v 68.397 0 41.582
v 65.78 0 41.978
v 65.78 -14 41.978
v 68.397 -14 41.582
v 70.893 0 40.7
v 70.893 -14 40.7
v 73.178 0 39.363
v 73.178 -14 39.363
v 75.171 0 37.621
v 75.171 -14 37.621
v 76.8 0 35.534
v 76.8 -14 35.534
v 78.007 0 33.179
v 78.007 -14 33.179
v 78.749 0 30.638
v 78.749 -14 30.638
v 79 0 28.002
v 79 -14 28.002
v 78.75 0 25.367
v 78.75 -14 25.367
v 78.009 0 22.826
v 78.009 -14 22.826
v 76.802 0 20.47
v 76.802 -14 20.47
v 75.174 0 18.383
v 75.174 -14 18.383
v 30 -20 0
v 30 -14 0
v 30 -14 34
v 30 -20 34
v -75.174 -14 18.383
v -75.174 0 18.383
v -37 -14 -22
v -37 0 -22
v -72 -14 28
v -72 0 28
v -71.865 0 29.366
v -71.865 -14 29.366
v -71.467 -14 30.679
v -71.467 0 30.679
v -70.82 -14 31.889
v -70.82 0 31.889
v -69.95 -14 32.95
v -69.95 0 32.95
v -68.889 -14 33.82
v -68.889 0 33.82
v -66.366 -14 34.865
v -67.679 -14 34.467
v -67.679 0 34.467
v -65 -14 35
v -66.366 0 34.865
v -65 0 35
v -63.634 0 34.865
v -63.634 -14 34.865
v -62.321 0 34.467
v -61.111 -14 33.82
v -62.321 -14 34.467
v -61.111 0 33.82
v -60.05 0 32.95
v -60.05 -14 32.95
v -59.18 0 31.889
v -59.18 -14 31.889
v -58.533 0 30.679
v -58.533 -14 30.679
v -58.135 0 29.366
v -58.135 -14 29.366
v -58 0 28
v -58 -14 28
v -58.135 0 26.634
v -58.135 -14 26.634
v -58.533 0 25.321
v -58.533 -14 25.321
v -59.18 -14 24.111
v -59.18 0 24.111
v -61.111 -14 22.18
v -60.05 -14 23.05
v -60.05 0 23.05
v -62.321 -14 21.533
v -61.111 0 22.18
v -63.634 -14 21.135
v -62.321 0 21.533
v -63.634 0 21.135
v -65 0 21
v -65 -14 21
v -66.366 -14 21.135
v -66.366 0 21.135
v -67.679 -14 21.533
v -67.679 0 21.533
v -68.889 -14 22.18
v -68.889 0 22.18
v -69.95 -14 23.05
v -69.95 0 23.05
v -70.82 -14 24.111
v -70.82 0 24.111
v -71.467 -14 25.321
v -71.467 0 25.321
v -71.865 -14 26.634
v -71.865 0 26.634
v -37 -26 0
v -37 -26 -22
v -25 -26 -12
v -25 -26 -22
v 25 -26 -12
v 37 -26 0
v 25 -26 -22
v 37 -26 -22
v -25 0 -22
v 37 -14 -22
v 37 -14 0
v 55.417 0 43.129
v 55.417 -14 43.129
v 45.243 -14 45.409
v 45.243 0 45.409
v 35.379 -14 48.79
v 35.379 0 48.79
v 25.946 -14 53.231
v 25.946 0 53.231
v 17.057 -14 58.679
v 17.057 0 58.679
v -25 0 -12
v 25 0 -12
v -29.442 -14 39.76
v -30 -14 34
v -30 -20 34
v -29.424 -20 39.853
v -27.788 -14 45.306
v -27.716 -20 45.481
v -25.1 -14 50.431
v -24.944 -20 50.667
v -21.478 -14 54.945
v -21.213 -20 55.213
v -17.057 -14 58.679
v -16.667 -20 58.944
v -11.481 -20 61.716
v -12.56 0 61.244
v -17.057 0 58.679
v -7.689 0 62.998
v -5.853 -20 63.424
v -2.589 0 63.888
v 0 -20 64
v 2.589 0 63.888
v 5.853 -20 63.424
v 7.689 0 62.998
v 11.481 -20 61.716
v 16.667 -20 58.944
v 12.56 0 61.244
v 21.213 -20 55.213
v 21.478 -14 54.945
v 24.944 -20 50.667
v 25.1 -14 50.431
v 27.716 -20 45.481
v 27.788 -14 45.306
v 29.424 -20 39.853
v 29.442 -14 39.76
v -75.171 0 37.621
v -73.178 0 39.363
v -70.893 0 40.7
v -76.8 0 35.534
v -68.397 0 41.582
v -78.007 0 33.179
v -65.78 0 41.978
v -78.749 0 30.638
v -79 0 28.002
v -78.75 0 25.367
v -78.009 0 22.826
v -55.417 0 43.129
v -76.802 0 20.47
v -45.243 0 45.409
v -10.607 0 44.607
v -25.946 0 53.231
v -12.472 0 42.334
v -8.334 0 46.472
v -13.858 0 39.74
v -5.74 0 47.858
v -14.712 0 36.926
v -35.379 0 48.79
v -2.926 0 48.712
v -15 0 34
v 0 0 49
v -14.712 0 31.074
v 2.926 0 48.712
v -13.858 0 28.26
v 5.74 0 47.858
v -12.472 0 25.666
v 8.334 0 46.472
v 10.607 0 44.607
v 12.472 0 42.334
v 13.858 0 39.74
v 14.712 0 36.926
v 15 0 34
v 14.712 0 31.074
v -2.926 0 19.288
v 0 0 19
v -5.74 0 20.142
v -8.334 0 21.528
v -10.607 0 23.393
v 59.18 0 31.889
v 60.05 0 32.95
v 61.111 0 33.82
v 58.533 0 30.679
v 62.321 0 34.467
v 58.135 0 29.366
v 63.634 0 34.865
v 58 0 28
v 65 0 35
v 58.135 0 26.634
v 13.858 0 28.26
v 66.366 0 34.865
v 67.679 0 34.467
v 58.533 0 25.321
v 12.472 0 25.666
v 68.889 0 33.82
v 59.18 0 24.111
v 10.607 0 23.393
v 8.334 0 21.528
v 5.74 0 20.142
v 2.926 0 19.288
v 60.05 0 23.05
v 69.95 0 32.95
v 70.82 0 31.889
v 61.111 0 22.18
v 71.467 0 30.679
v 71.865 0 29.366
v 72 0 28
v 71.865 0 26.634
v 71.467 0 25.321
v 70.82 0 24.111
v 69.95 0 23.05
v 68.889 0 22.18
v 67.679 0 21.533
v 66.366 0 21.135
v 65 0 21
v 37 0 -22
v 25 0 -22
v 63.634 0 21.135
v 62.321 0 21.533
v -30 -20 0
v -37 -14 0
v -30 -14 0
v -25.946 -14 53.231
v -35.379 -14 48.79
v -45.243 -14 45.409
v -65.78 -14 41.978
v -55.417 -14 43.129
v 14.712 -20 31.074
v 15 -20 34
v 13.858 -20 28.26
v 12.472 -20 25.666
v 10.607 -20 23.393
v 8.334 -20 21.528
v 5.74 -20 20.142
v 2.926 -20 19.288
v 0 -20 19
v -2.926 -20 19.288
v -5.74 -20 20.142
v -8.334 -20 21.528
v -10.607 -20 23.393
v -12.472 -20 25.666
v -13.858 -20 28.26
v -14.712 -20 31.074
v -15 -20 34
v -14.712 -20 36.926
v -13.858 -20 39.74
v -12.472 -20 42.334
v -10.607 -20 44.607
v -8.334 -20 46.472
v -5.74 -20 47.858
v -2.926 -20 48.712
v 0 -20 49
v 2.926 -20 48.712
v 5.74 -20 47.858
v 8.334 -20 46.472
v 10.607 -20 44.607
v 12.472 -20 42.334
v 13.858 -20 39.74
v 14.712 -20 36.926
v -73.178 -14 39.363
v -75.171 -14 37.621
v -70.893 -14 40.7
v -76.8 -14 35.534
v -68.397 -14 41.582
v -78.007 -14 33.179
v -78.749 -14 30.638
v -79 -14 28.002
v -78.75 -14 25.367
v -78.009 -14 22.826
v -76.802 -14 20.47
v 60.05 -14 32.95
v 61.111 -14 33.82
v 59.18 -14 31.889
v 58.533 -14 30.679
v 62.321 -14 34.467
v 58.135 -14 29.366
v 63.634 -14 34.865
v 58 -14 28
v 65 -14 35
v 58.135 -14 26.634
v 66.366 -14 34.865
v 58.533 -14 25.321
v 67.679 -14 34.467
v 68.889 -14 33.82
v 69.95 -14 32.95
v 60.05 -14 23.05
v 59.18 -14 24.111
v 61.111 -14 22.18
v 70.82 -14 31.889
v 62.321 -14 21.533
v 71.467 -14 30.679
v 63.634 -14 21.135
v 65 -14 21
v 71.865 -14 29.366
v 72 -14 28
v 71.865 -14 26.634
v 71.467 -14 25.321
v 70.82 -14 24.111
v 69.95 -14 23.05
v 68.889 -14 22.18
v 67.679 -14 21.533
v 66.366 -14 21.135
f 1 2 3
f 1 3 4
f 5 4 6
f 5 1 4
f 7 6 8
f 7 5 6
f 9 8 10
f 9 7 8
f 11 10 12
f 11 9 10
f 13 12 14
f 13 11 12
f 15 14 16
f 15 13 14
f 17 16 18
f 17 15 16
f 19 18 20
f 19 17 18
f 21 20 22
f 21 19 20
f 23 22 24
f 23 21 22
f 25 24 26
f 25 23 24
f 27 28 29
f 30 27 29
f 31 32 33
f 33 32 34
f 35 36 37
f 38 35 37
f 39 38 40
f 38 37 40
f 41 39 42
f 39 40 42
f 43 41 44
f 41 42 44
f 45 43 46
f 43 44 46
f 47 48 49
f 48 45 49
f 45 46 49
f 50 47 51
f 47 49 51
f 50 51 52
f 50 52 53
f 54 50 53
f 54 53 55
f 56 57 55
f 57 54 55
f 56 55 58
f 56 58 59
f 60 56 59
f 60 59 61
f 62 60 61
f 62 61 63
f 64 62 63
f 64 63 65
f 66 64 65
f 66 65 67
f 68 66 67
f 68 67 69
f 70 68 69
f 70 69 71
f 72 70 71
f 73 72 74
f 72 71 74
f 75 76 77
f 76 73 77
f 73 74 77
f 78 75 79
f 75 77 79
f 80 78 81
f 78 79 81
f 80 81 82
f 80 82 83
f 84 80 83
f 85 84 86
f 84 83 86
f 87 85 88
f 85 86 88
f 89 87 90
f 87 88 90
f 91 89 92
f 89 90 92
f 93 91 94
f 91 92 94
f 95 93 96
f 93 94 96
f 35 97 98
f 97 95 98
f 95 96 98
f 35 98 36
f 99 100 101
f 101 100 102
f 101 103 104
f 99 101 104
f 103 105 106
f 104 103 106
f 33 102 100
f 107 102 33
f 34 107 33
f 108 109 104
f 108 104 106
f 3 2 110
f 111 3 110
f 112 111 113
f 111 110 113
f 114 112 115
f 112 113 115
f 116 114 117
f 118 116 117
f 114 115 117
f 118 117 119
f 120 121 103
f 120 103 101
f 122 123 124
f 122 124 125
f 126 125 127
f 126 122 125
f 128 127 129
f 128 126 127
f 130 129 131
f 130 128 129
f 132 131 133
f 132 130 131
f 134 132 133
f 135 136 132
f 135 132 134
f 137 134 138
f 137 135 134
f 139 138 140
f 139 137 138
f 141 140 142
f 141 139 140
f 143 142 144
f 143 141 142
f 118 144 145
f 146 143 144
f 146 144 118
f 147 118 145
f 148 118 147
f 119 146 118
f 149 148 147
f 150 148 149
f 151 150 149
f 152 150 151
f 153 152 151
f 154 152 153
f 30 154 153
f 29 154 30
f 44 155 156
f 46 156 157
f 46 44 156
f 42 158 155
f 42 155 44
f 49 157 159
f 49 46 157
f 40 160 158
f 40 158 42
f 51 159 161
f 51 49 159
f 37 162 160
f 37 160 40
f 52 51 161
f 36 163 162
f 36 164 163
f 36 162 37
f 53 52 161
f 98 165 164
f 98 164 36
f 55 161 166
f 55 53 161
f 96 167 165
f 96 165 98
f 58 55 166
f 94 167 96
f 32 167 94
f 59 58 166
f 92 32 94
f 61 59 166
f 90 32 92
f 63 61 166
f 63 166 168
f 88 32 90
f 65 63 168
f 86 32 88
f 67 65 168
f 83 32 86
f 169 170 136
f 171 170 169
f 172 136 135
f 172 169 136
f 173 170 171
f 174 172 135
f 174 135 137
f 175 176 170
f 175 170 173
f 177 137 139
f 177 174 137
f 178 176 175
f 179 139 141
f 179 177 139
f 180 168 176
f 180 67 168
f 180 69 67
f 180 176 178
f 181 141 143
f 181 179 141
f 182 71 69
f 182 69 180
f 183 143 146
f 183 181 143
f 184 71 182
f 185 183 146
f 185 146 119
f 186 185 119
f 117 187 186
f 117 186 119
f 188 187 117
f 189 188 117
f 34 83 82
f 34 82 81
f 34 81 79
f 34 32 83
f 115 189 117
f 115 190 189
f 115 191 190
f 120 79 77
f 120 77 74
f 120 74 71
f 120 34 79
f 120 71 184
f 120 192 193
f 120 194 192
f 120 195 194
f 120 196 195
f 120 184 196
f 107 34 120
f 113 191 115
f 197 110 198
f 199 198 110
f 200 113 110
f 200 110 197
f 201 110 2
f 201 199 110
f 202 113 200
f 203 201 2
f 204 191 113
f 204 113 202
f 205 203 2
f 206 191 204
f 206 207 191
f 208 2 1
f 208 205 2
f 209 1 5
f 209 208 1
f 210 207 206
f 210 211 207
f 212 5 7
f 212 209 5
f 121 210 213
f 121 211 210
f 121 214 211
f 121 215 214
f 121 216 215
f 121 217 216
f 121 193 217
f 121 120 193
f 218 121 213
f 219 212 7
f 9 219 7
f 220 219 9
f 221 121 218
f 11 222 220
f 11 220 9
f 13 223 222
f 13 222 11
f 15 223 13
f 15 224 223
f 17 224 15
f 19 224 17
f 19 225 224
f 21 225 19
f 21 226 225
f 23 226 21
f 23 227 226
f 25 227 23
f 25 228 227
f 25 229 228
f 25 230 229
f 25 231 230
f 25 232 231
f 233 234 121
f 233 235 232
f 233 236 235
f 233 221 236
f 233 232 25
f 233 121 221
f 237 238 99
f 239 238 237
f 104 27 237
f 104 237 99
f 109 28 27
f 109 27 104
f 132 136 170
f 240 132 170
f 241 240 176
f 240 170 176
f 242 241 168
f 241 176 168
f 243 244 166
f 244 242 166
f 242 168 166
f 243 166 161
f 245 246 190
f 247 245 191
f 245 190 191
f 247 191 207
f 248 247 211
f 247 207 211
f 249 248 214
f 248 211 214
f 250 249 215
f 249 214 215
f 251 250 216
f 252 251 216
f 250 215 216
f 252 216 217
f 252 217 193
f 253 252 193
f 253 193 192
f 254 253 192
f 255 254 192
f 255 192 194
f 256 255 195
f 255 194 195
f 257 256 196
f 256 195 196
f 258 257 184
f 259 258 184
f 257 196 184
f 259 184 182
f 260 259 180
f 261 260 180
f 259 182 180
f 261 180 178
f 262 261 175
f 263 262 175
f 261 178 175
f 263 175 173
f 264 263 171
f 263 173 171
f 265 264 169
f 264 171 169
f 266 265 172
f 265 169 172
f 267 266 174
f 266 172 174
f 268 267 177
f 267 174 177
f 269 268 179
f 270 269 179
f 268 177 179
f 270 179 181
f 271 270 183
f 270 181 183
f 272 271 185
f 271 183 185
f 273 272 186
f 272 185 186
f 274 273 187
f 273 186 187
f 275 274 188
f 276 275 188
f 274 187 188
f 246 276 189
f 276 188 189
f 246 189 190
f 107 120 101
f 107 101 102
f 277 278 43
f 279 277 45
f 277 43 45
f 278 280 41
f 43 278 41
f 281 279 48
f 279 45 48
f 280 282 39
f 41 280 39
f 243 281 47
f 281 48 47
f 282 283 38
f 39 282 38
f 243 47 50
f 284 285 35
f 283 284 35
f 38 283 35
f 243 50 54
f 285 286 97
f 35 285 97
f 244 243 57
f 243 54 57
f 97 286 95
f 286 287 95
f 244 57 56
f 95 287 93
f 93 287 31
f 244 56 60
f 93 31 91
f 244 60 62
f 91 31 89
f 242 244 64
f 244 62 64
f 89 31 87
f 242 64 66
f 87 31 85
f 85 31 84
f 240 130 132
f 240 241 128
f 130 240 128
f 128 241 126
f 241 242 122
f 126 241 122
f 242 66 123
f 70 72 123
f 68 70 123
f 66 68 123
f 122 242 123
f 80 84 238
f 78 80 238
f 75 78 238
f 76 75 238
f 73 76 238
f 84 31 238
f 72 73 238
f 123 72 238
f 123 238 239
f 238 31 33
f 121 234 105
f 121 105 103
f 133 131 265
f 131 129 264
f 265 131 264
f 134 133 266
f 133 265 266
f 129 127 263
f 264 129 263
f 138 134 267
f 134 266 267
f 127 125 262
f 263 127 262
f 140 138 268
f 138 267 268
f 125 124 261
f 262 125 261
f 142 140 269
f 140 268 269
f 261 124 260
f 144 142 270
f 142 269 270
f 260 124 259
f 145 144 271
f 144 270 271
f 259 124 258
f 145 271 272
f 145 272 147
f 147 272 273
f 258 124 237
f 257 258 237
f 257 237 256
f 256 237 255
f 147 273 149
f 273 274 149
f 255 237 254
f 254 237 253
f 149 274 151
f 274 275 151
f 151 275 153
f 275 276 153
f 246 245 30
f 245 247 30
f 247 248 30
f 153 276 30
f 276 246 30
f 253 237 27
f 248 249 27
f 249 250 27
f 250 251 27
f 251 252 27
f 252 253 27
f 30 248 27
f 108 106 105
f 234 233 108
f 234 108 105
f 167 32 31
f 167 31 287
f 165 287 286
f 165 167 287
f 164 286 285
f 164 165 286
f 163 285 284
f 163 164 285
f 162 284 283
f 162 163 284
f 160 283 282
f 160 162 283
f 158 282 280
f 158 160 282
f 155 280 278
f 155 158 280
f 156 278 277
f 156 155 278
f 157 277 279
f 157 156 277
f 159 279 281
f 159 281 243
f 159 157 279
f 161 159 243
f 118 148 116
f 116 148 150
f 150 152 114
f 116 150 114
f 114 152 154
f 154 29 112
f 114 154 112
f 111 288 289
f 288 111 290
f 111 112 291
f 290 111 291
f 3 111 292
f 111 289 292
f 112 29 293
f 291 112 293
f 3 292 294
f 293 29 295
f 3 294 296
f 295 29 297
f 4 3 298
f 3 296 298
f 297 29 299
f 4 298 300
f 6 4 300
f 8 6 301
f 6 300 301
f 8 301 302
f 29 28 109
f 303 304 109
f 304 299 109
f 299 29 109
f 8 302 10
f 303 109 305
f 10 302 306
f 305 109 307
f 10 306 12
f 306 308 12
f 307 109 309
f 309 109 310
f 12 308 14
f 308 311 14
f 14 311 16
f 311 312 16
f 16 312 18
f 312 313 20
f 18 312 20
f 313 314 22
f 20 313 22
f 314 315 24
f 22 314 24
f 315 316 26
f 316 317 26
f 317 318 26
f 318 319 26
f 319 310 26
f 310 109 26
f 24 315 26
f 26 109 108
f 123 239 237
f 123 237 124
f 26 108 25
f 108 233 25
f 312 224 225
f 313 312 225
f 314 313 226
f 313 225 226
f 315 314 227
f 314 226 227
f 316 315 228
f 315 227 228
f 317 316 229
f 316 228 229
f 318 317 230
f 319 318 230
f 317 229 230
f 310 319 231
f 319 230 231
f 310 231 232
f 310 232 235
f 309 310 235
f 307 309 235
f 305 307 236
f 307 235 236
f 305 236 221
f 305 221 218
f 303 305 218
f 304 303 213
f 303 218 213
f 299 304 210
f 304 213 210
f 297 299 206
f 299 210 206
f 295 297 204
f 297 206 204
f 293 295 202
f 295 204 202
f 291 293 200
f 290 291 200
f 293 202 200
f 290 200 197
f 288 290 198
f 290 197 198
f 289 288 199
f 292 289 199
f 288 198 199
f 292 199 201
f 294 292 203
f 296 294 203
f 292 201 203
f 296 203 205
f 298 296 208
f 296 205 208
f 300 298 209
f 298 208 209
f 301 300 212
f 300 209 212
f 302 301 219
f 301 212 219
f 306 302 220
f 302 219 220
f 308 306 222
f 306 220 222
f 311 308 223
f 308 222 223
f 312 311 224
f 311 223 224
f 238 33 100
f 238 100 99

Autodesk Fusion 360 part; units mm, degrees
sketch "Sketch1" plane through (0, 0, 0) normal (0, 1, 0) x (1, 0, 0)
  line L0 (-37, 0) -> (37, 0)
  line L1 (37, 0) -> (37, 22)
  line L2 (37, 22) -> (25, 22)
  line L3 (25, 22) -> (25, 12)
  line L4 (25, 12) -> (-25, 12)
  line L5 (-25, 12) -> (-25, 22)
  line L6 (-25, 22) -> (-37, 22)
  line L7 (-37, 22) -> (-37, 0)
  circle A0 centre (0, -34) radius 15
  circle A1 centre (0, -34) radius 30
  line L8 (-30, 0) -> (-30, -34)
  line L9 (30, 0) -> (30, -34)
  circle A2 centre (65, -28) radius 7
  circle A3 centre (65, -28) radius 14
  line L10 (37, 22) -> (75.1738, -18.3827)
  arc A4 (65.7795, -41.9783) -> (17.0566, -58.6794) centre (71.069, -136.8309) ccw
  dimension "d1" = 25
  dimension "d2" = 25
  dimension "d3" = 37
  dimension "d4" = 37
  dimension "d5" = 22
  dimension "d6" = 22
  dimension "d7" = 12
  dimension "d8" = 12
  dimension "d9" = 30
  dimension "d10" = 34
  dimension "d11" = 37
  dimension "d12" = 60
  dimension "d13" = 14
  dimension "d14" = 28
  dimension "d15" = 65
  dimension "d16" = 28
  dimension "d17" = 190
extrude "Extrude1" add sketch "Sketch1" against normal blind 26 contours L0 L1 L2 L3 L4 L5 L6 L7
extrude "Extrude2" add sketch "Sketch1" against normal blind 20 contours L0 A1 L8 L9 | A1
extrude "Extrude3" add sketch "Sketch1" against normal blind 14 contours L0 L1 A1 L9 A3 L10 A4 | A3
mirror "Mirror1" about plane through (0, 0, 0) normal (1, 0, 0) of "Extrude3"
equation "d1 = ( 50 / 2 ) * 1 mm"
equation "d2 = d1"
equation "d3 = d1 + 12 mm"
equation "d4 = d3"
equation "d7 = d6 - 10 mm"
equation "d8 = d7"
equation "d11 = d3"
equation "d14 = ( 14 * 2 ) * 1 mm"
equation "d15 = ( 130 / 2 ) * 1 mm"
equation "d16 = 50 mm - 22 mm"
equation "d17 = ( 95 * 2 ) * 1 mm"
